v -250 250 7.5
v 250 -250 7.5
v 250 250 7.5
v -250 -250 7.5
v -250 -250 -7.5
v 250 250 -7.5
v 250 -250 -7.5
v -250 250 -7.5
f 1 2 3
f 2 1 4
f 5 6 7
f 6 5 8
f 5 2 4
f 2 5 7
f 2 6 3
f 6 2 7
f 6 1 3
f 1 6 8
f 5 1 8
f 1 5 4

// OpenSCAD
/*
OPENSCAD Project - EquinoxeFR 2011
License Creative Commons

Object: Base
*/


cube(size = [500,500,15], center = true);
